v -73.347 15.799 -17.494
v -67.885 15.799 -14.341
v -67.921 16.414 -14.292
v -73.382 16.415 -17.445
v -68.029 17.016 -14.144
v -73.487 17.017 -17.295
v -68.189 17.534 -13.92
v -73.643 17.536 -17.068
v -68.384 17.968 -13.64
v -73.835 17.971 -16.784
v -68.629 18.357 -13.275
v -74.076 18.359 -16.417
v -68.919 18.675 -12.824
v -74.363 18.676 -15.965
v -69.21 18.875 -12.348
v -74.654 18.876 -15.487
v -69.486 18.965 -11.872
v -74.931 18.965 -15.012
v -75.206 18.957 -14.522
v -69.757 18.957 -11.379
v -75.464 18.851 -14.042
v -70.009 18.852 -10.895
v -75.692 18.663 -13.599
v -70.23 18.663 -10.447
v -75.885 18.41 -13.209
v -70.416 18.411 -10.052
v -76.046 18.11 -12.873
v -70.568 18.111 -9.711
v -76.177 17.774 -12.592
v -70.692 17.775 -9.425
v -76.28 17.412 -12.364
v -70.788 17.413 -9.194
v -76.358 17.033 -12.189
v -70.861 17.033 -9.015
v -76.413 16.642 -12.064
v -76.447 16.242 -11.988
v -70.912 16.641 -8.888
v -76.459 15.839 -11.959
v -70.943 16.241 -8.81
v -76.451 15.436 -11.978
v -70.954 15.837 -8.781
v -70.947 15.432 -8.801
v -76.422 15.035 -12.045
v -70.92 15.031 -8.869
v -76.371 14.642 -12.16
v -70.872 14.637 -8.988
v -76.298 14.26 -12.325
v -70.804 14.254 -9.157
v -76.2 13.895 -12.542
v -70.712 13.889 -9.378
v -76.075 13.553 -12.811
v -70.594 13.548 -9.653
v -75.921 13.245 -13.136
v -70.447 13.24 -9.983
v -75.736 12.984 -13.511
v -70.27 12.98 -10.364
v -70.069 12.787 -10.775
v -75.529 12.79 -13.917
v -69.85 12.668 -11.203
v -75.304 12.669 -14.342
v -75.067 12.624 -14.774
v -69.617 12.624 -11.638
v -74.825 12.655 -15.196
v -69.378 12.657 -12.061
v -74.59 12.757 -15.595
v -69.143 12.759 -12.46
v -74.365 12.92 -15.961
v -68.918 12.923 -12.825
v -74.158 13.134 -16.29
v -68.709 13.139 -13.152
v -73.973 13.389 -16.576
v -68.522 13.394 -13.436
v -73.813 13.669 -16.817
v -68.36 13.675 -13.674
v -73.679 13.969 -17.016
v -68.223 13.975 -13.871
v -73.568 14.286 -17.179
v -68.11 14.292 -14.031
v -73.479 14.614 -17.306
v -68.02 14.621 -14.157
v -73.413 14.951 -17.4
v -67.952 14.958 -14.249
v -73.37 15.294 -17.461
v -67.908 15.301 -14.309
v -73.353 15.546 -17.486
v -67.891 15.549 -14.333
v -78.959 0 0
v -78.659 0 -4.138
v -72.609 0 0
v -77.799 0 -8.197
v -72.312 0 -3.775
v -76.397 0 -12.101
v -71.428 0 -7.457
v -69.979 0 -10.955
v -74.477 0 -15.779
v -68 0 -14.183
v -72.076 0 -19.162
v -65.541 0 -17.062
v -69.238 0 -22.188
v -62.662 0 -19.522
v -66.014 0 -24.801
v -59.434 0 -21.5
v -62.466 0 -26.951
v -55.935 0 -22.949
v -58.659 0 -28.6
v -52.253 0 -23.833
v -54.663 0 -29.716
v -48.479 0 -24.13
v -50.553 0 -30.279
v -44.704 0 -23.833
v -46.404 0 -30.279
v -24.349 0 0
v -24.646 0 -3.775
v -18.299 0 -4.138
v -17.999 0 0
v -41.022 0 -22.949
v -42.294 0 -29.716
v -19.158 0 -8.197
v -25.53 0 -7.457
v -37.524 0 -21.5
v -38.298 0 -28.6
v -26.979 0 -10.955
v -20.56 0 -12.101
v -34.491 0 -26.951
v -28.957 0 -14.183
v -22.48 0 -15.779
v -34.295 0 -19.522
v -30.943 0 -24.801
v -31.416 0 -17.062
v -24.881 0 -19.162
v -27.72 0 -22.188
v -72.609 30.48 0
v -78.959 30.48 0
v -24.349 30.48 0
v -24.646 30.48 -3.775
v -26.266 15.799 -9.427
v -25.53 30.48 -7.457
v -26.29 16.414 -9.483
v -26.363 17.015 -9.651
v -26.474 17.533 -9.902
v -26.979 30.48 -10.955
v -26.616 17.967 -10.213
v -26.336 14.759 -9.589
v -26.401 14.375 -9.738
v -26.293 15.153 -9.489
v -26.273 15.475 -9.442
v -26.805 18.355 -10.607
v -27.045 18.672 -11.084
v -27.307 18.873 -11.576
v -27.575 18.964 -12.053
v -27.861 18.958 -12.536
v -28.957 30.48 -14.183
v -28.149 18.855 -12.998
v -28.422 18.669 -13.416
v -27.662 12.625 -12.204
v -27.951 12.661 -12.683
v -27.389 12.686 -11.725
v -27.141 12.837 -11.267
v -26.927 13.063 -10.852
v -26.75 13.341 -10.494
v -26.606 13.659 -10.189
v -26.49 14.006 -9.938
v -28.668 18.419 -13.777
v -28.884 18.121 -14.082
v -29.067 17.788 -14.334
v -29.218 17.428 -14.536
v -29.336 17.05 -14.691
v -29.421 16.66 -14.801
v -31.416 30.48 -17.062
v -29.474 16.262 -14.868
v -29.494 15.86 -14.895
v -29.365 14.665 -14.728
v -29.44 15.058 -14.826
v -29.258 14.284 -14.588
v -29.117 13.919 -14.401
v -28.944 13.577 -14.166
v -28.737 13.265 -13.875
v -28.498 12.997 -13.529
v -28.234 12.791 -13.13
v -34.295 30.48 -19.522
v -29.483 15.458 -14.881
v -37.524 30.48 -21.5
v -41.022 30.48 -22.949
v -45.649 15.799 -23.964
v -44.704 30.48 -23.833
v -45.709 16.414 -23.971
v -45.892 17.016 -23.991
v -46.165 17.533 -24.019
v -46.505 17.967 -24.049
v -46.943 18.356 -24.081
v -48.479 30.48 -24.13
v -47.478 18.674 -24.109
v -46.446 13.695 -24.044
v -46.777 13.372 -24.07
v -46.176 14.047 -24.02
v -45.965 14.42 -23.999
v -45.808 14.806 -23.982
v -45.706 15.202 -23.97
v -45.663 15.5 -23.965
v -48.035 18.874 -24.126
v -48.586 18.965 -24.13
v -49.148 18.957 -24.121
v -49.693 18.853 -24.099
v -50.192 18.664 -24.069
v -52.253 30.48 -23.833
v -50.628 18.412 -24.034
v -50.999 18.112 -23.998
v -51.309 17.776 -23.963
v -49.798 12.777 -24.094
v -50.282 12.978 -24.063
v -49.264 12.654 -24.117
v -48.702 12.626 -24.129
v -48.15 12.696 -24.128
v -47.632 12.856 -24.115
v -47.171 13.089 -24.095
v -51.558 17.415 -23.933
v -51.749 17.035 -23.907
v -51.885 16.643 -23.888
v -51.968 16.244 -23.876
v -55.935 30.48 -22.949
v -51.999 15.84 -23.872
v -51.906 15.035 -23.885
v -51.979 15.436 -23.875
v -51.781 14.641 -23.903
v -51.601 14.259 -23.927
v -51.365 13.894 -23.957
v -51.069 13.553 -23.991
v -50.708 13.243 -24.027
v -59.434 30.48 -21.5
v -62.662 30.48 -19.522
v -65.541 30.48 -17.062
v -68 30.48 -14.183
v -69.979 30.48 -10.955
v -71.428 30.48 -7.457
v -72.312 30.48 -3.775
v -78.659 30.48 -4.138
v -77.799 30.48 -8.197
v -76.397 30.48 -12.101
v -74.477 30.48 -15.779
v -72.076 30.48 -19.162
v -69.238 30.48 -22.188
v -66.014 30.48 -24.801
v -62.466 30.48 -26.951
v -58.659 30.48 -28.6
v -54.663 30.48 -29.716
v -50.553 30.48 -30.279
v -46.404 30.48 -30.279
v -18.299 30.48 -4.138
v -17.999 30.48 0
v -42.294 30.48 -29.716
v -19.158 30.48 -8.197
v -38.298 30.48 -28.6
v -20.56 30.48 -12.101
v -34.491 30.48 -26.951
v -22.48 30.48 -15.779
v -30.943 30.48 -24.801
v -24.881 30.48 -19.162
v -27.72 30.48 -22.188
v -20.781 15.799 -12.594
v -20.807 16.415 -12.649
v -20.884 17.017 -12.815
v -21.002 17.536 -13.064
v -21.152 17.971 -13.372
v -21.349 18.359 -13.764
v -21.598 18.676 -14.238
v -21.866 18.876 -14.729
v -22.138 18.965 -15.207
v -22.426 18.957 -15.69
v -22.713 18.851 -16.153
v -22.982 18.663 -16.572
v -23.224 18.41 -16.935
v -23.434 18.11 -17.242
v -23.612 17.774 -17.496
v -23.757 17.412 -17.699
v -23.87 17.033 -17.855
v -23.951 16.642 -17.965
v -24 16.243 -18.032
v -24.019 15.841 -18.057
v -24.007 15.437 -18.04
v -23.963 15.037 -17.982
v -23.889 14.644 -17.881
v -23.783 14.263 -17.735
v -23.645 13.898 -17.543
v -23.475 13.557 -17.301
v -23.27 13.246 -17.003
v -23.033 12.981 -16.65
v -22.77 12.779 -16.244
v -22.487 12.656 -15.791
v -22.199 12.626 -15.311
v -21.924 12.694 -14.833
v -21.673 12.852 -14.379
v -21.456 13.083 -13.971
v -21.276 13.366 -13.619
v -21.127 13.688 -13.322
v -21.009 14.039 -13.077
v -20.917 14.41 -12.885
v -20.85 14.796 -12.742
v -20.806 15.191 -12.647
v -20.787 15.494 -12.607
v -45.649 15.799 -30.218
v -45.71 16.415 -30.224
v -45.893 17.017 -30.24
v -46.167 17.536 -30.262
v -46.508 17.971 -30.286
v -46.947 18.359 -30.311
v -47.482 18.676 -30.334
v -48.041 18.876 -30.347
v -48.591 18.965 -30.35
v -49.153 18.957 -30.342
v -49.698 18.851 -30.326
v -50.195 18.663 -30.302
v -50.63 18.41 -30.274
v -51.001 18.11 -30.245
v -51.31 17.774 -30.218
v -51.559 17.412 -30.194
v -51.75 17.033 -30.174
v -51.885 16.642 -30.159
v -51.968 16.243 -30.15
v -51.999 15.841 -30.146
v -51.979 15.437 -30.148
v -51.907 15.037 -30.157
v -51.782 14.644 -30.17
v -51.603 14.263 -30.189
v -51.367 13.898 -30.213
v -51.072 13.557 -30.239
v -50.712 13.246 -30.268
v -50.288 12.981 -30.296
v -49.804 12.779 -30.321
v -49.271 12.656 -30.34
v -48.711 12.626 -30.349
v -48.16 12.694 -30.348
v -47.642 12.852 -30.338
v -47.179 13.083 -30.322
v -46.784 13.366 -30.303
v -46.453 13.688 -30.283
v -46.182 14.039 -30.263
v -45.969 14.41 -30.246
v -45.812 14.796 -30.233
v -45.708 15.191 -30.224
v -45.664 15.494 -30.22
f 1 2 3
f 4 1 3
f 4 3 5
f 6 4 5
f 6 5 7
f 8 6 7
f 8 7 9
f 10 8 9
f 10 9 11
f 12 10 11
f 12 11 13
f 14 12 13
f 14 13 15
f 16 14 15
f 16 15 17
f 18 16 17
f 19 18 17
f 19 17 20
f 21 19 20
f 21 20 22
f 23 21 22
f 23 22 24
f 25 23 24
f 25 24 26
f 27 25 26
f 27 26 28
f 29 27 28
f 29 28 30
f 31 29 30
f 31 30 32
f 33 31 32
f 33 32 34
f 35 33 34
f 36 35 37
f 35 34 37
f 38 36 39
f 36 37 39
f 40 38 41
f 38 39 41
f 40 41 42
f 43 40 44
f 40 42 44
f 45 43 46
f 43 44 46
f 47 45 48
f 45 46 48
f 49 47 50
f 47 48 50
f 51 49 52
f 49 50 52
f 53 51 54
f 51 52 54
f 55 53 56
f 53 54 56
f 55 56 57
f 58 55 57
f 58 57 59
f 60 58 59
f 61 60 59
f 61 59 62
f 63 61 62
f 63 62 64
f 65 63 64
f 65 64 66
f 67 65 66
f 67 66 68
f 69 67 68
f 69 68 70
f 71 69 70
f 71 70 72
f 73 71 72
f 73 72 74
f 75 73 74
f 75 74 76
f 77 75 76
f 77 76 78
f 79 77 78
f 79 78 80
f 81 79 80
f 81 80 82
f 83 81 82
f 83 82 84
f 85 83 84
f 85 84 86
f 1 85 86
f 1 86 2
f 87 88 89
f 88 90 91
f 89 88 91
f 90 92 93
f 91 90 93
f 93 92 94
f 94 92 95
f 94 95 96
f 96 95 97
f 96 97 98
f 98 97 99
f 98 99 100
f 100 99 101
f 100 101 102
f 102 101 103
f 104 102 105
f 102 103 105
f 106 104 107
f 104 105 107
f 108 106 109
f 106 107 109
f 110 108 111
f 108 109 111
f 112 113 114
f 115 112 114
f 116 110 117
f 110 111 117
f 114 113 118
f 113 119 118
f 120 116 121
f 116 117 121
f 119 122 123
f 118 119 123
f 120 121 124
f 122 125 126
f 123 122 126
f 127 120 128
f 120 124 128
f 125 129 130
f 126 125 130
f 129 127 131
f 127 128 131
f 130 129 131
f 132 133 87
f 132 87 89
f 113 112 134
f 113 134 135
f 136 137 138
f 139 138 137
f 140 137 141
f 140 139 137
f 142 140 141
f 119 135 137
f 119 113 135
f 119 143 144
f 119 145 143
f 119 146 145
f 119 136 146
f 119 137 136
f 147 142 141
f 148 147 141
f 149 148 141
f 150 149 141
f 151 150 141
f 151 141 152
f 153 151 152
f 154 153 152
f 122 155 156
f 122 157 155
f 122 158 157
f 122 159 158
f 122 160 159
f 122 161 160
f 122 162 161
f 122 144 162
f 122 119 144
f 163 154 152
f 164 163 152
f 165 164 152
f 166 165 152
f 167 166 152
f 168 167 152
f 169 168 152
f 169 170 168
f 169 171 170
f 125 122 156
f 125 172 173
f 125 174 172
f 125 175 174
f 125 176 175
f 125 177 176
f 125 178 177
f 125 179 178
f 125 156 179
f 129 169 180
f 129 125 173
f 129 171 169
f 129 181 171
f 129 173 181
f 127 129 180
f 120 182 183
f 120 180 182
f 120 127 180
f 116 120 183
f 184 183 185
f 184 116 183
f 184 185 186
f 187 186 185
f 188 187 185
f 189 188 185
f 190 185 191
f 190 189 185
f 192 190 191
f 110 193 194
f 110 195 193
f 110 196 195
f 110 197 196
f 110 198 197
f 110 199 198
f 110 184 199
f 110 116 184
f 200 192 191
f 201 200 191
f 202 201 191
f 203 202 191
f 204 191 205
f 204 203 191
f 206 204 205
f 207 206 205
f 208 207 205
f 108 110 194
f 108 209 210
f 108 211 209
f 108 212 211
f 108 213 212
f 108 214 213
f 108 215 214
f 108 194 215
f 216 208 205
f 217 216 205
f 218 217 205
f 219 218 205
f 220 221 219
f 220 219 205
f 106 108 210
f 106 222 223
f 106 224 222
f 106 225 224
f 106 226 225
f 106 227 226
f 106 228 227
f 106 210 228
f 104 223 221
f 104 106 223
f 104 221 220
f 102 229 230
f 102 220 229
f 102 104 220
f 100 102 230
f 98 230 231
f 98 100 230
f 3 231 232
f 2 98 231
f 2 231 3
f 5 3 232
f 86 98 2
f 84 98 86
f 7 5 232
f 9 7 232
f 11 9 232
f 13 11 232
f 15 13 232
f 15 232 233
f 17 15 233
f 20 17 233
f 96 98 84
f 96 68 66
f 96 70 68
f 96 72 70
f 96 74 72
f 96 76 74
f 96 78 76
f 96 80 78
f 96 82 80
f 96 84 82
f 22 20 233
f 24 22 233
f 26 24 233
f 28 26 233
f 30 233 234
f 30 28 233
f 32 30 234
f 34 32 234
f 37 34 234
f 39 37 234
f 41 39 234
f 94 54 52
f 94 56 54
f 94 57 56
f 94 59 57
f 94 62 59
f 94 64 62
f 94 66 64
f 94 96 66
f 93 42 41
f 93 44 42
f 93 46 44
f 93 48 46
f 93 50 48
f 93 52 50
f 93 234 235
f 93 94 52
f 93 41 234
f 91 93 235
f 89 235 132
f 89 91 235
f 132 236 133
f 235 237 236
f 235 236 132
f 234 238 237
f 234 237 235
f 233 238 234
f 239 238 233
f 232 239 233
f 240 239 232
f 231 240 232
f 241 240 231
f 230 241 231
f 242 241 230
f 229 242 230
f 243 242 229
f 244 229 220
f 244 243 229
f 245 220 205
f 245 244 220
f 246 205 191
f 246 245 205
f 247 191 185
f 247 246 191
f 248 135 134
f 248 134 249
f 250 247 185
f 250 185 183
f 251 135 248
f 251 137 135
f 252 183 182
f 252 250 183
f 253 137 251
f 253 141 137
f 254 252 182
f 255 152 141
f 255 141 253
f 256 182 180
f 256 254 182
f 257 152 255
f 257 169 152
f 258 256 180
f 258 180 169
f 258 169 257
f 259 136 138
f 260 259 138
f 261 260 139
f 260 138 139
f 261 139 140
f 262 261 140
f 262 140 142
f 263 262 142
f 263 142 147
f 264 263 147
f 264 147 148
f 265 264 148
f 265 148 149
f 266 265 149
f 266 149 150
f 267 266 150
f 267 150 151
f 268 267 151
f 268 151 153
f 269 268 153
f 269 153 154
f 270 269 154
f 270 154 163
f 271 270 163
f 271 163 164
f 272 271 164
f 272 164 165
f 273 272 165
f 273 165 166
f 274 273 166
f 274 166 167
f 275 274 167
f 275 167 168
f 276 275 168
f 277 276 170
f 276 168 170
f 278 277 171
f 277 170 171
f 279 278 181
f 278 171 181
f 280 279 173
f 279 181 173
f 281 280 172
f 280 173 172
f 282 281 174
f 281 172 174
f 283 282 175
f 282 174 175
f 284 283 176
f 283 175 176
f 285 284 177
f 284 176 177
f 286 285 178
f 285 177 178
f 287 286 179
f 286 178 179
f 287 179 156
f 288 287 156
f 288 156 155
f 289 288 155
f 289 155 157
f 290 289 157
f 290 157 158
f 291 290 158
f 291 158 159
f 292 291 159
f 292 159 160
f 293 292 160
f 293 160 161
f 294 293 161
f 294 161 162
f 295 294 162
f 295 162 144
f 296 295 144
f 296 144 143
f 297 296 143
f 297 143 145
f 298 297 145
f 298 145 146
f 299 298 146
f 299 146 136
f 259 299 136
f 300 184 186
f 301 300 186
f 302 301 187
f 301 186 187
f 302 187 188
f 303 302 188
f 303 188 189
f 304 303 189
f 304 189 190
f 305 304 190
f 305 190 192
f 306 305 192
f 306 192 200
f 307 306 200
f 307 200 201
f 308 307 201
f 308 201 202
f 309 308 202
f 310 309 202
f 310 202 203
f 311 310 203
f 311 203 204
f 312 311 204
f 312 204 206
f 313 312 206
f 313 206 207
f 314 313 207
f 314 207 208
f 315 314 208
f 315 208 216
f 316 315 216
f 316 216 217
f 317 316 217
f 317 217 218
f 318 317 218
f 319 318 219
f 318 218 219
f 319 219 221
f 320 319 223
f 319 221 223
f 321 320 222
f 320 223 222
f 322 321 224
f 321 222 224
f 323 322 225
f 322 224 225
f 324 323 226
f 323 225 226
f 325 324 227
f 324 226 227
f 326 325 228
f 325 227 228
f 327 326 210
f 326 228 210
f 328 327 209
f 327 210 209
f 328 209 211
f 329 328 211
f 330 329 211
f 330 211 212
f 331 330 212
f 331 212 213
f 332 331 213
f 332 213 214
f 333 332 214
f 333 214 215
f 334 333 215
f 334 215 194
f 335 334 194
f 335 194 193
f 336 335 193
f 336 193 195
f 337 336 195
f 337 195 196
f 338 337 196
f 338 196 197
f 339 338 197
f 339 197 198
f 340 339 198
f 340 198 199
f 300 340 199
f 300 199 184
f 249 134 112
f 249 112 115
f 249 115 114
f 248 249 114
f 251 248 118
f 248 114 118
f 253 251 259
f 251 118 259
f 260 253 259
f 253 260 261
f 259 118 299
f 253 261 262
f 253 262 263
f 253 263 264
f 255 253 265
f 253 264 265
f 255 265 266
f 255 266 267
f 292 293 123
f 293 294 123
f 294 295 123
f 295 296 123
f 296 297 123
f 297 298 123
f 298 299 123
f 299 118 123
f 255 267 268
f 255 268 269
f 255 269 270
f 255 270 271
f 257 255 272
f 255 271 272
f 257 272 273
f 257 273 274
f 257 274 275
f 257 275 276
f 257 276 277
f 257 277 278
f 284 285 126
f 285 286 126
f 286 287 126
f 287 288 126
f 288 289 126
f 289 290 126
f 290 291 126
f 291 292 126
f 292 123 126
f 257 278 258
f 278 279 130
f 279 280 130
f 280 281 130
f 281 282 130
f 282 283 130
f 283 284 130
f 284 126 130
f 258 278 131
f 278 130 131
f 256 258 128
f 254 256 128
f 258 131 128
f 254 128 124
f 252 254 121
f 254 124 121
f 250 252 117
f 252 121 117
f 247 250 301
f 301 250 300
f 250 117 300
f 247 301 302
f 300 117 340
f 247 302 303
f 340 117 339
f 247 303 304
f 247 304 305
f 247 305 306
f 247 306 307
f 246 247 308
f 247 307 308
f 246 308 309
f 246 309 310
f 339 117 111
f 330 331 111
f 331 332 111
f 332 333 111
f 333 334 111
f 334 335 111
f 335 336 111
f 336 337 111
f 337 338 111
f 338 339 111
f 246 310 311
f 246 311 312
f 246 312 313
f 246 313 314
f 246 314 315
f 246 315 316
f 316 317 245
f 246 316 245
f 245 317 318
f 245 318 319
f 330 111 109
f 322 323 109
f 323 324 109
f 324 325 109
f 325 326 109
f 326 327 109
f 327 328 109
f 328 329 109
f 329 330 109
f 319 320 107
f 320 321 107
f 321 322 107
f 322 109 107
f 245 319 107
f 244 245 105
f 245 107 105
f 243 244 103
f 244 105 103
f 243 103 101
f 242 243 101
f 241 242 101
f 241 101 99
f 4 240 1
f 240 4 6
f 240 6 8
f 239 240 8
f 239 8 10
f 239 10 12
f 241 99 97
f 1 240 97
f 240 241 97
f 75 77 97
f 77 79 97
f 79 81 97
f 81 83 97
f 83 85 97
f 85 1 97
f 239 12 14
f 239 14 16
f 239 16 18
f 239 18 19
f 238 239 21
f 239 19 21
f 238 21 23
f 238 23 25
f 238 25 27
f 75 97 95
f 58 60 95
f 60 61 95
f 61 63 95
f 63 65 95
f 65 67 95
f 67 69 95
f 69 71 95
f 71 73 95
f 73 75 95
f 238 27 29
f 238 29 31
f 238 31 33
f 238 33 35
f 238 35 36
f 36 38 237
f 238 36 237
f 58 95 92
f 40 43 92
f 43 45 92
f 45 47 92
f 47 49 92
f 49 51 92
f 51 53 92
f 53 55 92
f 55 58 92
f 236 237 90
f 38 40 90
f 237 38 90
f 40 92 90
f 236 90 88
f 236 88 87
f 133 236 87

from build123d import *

# Parameters (mm, degrees)
BOSS_EXTRUDE1_DEPTH = 30.48
SKETCH3_R           = 24.13
CUT_EXTRUDE4_DEPTH  = 90.914560616
SKETCH4_R           = 3.175
CUT_EXTRUDE5_DEPTH  = 63.754
CIRPATTERN3_COUNT   = 6


with BuildPart() as part:
    # Sketch1 → Boss-Extrude1 (new body)
    with BuildSketch(Plane(origin=(0, 0, 0), x_dir=(1, 0, 0), z_dir=(0, 1, 0))):
        with BuildLine():
            Line((-78.958715675, 0), (-17.998715675, 0))
            ThreePointArc((-17.998715675, 0), (-48.478715675, 30.349942827), (-78.958715675, 0))
        make_face()
    extrude(amount=BOSS_EXTRUDE1_DEPTH)

    # Sketch3 → Cut-Extrude4 (cut, through all)
    with BuildSketch(Plane(origin=(0, 0, 0), x_dir=(1, 0, 0), z_dir=(0, 1, 0))):
        with Locations((-48.478715675, 0)):
            Circle(SKETCH3_R)
    extrude(amount=CUT_EXTRUDE4_DEPTH, mode=Mode.SUBTRACT)

    # Sketch4 → Cut-Extrude5 (cut)
    with BuildSketch(Plane.XY):
        with Locations((-48.824364134, 15.798935299)):
            Circle(SKETCH4_R)
    cut_extrude5 = extrude(amount=-CUT_EXTRUDE5_DEPTH, mode=Mode.SUBTRACT)

    # CirPattern3: Cut-Extrude5 ×6 about axis
    cirpattern3_axis = Axis((-48.478715675, 30.48, 0.130335837), (0, -1, 0))
    for i in range(1, CIRPATTERN3_COUNT):
        add(cut_extrude5.rotate(cirpattern3_axis, i * 360 / CIRPATTERN3_COUNT), mode=Mode.SUBTRACT)


solid = part.part
